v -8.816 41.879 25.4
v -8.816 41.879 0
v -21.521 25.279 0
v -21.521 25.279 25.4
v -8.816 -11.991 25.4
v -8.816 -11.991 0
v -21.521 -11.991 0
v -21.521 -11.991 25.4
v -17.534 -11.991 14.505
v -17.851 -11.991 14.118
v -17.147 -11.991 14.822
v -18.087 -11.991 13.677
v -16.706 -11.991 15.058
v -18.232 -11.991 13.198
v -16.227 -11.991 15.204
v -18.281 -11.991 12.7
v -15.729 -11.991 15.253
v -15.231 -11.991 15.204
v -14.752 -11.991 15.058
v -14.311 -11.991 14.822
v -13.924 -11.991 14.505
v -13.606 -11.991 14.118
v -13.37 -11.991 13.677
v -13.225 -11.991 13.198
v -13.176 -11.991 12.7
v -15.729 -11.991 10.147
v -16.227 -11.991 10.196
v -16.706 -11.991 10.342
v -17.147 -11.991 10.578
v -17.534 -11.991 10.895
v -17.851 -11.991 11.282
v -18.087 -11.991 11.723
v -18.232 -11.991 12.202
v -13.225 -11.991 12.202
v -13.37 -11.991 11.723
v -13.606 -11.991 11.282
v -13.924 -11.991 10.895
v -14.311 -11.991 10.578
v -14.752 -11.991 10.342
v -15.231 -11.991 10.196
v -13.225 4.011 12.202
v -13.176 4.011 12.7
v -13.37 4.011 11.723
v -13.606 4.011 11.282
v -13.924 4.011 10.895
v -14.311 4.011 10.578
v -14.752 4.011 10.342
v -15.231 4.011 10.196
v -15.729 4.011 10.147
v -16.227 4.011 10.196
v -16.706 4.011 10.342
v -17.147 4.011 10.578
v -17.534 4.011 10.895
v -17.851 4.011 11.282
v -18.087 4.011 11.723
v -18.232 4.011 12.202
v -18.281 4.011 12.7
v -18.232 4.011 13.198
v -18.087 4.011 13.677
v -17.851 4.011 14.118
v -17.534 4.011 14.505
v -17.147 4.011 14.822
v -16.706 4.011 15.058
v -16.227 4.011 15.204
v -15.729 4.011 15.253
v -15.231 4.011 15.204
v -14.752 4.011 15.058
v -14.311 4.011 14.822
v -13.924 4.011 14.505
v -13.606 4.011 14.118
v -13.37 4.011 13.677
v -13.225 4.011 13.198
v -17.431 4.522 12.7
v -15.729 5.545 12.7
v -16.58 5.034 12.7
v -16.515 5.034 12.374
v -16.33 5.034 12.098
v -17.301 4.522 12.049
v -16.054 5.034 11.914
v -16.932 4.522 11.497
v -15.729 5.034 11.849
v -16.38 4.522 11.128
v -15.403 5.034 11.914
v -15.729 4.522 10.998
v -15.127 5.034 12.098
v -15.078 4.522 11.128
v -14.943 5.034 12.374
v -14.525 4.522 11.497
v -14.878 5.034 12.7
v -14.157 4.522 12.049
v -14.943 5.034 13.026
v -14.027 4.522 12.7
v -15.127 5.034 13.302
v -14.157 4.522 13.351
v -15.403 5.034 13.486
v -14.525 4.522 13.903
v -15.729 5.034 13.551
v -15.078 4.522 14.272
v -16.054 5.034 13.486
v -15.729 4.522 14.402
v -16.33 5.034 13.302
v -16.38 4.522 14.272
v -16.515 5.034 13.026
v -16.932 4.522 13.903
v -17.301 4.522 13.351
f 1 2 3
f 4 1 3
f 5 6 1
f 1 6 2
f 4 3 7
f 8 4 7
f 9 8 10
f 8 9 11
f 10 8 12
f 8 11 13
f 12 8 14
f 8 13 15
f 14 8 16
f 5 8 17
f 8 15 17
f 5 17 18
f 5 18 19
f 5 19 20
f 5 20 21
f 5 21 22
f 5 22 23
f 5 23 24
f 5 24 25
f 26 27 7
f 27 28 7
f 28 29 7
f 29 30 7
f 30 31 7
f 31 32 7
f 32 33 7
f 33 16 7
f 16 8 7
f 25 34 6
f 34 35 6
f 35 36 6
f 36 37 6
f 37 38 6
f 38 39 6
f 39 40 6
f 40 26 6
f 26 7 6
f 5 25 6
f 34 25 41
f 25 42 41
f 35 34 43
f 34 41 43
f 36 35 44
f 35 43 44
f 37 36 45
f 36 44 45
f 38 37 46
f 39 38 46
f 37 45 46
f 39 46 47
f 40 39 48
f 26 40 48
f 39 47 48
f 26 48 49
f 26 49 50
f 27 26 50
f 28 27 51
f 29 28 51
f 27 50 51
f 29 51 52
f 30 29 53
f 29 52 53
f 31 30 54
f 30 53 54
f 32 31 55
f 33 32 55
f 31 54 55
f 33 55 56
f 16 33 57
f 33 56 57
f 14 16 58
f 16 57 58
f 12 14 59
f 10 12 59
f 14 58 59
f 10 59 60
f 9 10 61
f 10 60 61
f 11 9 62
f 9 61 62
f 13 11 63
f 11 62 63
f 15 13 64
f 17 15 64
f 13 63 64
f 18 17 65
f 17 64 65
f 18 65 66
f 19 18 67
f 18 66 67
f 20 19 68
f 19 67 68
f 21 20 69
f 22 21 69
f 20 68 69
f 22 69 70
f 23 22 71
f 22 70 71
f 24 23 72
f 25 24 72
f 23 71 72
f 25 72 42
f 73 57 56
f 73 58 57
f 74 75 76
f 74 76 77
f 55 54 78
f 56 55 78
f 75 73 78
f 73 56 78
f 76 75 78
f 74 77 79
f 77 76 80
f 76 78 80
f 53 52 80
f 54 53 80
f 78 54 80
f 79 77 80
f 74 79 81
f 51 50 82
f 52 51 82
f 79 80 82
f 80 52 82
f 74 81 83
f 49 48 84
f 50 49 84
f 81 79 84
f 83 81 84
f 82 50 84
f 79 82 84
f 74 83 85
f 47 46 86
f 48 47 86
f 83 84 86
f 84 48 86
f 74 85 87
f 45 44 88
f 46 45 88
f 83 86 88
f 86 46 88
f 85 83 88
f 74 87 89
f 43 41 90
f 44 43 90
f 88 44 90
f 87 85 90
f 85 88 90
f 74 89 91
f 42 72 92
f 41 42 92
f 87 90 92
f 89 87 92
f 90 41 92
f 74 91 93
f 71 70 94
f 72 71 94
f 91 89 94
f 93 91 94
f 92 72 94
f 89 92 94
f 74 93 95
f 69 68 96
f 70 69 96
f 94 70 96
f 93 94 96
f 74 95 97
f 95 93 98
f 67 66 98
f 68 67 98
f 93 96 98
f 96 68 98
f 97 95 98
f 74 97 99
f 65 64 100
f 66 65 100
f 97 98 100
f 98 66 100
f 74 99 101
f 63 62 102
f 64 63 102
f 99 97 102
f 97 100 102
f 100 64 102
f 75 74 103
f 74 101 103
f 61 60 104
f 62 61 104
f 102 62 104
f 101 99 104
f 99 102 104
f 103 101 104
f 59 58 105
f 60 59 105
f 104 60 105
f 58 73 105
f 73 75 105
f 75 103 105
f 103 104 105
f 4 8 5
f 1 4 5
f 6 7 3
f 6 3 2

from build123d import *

# Parameters (mm, degrees)
EXTRUDE1_DEPTH              = 25.4
F_1_4_20_TAPPED_HOLE2_D     = 5.1054
F_1_4_20_TAPPED_HOLE2_DEPTH = 16.002
F_1_4_20_TAPPED_HOLE2_TIP   = 1.533816902


with BuildPart() as part:
    # Sketch1 → Extrude1 (new body)
    with BuildSketch(Plane.XY):
        Polygon((-8.815807595, 41.879239751), (-21.52120708, 25.279287896), (-21.52120708, -11.990787033), (-8.815807595, -11.990787033), align=None)
    extrude(amount=EXTRUDE1_DEPTH)

    # 1/4-20 Tapped Hole2
    with Locations(Plane(origin=(7.200348194, -11.990787033, 18.061260674), x_dir=(-1, 0, 0), z_dir=(0, -1, 0))):
        with Locations((22.929112651, 5.361260674)):
            Hole(F_1_4_20_TAPPED_HOLE2_D / 2, depth=F_1_4_20_TAPPED_HOLE2_DEPTH)
            with Locations((0, 0, -(F_1_4_20_TAPPED_HOLE2_DEPTH + F_1_4_20_TAPPED_HOLE2_TIP / 2))):  # 118° drill point
                Cone(0, F_1_4_20_TAPPED_HOLE2_D / 2, F_1_4_20_TAPPED_HOLE2_TIP, mode=Mode.SUBTRACT)


solid = part.part
